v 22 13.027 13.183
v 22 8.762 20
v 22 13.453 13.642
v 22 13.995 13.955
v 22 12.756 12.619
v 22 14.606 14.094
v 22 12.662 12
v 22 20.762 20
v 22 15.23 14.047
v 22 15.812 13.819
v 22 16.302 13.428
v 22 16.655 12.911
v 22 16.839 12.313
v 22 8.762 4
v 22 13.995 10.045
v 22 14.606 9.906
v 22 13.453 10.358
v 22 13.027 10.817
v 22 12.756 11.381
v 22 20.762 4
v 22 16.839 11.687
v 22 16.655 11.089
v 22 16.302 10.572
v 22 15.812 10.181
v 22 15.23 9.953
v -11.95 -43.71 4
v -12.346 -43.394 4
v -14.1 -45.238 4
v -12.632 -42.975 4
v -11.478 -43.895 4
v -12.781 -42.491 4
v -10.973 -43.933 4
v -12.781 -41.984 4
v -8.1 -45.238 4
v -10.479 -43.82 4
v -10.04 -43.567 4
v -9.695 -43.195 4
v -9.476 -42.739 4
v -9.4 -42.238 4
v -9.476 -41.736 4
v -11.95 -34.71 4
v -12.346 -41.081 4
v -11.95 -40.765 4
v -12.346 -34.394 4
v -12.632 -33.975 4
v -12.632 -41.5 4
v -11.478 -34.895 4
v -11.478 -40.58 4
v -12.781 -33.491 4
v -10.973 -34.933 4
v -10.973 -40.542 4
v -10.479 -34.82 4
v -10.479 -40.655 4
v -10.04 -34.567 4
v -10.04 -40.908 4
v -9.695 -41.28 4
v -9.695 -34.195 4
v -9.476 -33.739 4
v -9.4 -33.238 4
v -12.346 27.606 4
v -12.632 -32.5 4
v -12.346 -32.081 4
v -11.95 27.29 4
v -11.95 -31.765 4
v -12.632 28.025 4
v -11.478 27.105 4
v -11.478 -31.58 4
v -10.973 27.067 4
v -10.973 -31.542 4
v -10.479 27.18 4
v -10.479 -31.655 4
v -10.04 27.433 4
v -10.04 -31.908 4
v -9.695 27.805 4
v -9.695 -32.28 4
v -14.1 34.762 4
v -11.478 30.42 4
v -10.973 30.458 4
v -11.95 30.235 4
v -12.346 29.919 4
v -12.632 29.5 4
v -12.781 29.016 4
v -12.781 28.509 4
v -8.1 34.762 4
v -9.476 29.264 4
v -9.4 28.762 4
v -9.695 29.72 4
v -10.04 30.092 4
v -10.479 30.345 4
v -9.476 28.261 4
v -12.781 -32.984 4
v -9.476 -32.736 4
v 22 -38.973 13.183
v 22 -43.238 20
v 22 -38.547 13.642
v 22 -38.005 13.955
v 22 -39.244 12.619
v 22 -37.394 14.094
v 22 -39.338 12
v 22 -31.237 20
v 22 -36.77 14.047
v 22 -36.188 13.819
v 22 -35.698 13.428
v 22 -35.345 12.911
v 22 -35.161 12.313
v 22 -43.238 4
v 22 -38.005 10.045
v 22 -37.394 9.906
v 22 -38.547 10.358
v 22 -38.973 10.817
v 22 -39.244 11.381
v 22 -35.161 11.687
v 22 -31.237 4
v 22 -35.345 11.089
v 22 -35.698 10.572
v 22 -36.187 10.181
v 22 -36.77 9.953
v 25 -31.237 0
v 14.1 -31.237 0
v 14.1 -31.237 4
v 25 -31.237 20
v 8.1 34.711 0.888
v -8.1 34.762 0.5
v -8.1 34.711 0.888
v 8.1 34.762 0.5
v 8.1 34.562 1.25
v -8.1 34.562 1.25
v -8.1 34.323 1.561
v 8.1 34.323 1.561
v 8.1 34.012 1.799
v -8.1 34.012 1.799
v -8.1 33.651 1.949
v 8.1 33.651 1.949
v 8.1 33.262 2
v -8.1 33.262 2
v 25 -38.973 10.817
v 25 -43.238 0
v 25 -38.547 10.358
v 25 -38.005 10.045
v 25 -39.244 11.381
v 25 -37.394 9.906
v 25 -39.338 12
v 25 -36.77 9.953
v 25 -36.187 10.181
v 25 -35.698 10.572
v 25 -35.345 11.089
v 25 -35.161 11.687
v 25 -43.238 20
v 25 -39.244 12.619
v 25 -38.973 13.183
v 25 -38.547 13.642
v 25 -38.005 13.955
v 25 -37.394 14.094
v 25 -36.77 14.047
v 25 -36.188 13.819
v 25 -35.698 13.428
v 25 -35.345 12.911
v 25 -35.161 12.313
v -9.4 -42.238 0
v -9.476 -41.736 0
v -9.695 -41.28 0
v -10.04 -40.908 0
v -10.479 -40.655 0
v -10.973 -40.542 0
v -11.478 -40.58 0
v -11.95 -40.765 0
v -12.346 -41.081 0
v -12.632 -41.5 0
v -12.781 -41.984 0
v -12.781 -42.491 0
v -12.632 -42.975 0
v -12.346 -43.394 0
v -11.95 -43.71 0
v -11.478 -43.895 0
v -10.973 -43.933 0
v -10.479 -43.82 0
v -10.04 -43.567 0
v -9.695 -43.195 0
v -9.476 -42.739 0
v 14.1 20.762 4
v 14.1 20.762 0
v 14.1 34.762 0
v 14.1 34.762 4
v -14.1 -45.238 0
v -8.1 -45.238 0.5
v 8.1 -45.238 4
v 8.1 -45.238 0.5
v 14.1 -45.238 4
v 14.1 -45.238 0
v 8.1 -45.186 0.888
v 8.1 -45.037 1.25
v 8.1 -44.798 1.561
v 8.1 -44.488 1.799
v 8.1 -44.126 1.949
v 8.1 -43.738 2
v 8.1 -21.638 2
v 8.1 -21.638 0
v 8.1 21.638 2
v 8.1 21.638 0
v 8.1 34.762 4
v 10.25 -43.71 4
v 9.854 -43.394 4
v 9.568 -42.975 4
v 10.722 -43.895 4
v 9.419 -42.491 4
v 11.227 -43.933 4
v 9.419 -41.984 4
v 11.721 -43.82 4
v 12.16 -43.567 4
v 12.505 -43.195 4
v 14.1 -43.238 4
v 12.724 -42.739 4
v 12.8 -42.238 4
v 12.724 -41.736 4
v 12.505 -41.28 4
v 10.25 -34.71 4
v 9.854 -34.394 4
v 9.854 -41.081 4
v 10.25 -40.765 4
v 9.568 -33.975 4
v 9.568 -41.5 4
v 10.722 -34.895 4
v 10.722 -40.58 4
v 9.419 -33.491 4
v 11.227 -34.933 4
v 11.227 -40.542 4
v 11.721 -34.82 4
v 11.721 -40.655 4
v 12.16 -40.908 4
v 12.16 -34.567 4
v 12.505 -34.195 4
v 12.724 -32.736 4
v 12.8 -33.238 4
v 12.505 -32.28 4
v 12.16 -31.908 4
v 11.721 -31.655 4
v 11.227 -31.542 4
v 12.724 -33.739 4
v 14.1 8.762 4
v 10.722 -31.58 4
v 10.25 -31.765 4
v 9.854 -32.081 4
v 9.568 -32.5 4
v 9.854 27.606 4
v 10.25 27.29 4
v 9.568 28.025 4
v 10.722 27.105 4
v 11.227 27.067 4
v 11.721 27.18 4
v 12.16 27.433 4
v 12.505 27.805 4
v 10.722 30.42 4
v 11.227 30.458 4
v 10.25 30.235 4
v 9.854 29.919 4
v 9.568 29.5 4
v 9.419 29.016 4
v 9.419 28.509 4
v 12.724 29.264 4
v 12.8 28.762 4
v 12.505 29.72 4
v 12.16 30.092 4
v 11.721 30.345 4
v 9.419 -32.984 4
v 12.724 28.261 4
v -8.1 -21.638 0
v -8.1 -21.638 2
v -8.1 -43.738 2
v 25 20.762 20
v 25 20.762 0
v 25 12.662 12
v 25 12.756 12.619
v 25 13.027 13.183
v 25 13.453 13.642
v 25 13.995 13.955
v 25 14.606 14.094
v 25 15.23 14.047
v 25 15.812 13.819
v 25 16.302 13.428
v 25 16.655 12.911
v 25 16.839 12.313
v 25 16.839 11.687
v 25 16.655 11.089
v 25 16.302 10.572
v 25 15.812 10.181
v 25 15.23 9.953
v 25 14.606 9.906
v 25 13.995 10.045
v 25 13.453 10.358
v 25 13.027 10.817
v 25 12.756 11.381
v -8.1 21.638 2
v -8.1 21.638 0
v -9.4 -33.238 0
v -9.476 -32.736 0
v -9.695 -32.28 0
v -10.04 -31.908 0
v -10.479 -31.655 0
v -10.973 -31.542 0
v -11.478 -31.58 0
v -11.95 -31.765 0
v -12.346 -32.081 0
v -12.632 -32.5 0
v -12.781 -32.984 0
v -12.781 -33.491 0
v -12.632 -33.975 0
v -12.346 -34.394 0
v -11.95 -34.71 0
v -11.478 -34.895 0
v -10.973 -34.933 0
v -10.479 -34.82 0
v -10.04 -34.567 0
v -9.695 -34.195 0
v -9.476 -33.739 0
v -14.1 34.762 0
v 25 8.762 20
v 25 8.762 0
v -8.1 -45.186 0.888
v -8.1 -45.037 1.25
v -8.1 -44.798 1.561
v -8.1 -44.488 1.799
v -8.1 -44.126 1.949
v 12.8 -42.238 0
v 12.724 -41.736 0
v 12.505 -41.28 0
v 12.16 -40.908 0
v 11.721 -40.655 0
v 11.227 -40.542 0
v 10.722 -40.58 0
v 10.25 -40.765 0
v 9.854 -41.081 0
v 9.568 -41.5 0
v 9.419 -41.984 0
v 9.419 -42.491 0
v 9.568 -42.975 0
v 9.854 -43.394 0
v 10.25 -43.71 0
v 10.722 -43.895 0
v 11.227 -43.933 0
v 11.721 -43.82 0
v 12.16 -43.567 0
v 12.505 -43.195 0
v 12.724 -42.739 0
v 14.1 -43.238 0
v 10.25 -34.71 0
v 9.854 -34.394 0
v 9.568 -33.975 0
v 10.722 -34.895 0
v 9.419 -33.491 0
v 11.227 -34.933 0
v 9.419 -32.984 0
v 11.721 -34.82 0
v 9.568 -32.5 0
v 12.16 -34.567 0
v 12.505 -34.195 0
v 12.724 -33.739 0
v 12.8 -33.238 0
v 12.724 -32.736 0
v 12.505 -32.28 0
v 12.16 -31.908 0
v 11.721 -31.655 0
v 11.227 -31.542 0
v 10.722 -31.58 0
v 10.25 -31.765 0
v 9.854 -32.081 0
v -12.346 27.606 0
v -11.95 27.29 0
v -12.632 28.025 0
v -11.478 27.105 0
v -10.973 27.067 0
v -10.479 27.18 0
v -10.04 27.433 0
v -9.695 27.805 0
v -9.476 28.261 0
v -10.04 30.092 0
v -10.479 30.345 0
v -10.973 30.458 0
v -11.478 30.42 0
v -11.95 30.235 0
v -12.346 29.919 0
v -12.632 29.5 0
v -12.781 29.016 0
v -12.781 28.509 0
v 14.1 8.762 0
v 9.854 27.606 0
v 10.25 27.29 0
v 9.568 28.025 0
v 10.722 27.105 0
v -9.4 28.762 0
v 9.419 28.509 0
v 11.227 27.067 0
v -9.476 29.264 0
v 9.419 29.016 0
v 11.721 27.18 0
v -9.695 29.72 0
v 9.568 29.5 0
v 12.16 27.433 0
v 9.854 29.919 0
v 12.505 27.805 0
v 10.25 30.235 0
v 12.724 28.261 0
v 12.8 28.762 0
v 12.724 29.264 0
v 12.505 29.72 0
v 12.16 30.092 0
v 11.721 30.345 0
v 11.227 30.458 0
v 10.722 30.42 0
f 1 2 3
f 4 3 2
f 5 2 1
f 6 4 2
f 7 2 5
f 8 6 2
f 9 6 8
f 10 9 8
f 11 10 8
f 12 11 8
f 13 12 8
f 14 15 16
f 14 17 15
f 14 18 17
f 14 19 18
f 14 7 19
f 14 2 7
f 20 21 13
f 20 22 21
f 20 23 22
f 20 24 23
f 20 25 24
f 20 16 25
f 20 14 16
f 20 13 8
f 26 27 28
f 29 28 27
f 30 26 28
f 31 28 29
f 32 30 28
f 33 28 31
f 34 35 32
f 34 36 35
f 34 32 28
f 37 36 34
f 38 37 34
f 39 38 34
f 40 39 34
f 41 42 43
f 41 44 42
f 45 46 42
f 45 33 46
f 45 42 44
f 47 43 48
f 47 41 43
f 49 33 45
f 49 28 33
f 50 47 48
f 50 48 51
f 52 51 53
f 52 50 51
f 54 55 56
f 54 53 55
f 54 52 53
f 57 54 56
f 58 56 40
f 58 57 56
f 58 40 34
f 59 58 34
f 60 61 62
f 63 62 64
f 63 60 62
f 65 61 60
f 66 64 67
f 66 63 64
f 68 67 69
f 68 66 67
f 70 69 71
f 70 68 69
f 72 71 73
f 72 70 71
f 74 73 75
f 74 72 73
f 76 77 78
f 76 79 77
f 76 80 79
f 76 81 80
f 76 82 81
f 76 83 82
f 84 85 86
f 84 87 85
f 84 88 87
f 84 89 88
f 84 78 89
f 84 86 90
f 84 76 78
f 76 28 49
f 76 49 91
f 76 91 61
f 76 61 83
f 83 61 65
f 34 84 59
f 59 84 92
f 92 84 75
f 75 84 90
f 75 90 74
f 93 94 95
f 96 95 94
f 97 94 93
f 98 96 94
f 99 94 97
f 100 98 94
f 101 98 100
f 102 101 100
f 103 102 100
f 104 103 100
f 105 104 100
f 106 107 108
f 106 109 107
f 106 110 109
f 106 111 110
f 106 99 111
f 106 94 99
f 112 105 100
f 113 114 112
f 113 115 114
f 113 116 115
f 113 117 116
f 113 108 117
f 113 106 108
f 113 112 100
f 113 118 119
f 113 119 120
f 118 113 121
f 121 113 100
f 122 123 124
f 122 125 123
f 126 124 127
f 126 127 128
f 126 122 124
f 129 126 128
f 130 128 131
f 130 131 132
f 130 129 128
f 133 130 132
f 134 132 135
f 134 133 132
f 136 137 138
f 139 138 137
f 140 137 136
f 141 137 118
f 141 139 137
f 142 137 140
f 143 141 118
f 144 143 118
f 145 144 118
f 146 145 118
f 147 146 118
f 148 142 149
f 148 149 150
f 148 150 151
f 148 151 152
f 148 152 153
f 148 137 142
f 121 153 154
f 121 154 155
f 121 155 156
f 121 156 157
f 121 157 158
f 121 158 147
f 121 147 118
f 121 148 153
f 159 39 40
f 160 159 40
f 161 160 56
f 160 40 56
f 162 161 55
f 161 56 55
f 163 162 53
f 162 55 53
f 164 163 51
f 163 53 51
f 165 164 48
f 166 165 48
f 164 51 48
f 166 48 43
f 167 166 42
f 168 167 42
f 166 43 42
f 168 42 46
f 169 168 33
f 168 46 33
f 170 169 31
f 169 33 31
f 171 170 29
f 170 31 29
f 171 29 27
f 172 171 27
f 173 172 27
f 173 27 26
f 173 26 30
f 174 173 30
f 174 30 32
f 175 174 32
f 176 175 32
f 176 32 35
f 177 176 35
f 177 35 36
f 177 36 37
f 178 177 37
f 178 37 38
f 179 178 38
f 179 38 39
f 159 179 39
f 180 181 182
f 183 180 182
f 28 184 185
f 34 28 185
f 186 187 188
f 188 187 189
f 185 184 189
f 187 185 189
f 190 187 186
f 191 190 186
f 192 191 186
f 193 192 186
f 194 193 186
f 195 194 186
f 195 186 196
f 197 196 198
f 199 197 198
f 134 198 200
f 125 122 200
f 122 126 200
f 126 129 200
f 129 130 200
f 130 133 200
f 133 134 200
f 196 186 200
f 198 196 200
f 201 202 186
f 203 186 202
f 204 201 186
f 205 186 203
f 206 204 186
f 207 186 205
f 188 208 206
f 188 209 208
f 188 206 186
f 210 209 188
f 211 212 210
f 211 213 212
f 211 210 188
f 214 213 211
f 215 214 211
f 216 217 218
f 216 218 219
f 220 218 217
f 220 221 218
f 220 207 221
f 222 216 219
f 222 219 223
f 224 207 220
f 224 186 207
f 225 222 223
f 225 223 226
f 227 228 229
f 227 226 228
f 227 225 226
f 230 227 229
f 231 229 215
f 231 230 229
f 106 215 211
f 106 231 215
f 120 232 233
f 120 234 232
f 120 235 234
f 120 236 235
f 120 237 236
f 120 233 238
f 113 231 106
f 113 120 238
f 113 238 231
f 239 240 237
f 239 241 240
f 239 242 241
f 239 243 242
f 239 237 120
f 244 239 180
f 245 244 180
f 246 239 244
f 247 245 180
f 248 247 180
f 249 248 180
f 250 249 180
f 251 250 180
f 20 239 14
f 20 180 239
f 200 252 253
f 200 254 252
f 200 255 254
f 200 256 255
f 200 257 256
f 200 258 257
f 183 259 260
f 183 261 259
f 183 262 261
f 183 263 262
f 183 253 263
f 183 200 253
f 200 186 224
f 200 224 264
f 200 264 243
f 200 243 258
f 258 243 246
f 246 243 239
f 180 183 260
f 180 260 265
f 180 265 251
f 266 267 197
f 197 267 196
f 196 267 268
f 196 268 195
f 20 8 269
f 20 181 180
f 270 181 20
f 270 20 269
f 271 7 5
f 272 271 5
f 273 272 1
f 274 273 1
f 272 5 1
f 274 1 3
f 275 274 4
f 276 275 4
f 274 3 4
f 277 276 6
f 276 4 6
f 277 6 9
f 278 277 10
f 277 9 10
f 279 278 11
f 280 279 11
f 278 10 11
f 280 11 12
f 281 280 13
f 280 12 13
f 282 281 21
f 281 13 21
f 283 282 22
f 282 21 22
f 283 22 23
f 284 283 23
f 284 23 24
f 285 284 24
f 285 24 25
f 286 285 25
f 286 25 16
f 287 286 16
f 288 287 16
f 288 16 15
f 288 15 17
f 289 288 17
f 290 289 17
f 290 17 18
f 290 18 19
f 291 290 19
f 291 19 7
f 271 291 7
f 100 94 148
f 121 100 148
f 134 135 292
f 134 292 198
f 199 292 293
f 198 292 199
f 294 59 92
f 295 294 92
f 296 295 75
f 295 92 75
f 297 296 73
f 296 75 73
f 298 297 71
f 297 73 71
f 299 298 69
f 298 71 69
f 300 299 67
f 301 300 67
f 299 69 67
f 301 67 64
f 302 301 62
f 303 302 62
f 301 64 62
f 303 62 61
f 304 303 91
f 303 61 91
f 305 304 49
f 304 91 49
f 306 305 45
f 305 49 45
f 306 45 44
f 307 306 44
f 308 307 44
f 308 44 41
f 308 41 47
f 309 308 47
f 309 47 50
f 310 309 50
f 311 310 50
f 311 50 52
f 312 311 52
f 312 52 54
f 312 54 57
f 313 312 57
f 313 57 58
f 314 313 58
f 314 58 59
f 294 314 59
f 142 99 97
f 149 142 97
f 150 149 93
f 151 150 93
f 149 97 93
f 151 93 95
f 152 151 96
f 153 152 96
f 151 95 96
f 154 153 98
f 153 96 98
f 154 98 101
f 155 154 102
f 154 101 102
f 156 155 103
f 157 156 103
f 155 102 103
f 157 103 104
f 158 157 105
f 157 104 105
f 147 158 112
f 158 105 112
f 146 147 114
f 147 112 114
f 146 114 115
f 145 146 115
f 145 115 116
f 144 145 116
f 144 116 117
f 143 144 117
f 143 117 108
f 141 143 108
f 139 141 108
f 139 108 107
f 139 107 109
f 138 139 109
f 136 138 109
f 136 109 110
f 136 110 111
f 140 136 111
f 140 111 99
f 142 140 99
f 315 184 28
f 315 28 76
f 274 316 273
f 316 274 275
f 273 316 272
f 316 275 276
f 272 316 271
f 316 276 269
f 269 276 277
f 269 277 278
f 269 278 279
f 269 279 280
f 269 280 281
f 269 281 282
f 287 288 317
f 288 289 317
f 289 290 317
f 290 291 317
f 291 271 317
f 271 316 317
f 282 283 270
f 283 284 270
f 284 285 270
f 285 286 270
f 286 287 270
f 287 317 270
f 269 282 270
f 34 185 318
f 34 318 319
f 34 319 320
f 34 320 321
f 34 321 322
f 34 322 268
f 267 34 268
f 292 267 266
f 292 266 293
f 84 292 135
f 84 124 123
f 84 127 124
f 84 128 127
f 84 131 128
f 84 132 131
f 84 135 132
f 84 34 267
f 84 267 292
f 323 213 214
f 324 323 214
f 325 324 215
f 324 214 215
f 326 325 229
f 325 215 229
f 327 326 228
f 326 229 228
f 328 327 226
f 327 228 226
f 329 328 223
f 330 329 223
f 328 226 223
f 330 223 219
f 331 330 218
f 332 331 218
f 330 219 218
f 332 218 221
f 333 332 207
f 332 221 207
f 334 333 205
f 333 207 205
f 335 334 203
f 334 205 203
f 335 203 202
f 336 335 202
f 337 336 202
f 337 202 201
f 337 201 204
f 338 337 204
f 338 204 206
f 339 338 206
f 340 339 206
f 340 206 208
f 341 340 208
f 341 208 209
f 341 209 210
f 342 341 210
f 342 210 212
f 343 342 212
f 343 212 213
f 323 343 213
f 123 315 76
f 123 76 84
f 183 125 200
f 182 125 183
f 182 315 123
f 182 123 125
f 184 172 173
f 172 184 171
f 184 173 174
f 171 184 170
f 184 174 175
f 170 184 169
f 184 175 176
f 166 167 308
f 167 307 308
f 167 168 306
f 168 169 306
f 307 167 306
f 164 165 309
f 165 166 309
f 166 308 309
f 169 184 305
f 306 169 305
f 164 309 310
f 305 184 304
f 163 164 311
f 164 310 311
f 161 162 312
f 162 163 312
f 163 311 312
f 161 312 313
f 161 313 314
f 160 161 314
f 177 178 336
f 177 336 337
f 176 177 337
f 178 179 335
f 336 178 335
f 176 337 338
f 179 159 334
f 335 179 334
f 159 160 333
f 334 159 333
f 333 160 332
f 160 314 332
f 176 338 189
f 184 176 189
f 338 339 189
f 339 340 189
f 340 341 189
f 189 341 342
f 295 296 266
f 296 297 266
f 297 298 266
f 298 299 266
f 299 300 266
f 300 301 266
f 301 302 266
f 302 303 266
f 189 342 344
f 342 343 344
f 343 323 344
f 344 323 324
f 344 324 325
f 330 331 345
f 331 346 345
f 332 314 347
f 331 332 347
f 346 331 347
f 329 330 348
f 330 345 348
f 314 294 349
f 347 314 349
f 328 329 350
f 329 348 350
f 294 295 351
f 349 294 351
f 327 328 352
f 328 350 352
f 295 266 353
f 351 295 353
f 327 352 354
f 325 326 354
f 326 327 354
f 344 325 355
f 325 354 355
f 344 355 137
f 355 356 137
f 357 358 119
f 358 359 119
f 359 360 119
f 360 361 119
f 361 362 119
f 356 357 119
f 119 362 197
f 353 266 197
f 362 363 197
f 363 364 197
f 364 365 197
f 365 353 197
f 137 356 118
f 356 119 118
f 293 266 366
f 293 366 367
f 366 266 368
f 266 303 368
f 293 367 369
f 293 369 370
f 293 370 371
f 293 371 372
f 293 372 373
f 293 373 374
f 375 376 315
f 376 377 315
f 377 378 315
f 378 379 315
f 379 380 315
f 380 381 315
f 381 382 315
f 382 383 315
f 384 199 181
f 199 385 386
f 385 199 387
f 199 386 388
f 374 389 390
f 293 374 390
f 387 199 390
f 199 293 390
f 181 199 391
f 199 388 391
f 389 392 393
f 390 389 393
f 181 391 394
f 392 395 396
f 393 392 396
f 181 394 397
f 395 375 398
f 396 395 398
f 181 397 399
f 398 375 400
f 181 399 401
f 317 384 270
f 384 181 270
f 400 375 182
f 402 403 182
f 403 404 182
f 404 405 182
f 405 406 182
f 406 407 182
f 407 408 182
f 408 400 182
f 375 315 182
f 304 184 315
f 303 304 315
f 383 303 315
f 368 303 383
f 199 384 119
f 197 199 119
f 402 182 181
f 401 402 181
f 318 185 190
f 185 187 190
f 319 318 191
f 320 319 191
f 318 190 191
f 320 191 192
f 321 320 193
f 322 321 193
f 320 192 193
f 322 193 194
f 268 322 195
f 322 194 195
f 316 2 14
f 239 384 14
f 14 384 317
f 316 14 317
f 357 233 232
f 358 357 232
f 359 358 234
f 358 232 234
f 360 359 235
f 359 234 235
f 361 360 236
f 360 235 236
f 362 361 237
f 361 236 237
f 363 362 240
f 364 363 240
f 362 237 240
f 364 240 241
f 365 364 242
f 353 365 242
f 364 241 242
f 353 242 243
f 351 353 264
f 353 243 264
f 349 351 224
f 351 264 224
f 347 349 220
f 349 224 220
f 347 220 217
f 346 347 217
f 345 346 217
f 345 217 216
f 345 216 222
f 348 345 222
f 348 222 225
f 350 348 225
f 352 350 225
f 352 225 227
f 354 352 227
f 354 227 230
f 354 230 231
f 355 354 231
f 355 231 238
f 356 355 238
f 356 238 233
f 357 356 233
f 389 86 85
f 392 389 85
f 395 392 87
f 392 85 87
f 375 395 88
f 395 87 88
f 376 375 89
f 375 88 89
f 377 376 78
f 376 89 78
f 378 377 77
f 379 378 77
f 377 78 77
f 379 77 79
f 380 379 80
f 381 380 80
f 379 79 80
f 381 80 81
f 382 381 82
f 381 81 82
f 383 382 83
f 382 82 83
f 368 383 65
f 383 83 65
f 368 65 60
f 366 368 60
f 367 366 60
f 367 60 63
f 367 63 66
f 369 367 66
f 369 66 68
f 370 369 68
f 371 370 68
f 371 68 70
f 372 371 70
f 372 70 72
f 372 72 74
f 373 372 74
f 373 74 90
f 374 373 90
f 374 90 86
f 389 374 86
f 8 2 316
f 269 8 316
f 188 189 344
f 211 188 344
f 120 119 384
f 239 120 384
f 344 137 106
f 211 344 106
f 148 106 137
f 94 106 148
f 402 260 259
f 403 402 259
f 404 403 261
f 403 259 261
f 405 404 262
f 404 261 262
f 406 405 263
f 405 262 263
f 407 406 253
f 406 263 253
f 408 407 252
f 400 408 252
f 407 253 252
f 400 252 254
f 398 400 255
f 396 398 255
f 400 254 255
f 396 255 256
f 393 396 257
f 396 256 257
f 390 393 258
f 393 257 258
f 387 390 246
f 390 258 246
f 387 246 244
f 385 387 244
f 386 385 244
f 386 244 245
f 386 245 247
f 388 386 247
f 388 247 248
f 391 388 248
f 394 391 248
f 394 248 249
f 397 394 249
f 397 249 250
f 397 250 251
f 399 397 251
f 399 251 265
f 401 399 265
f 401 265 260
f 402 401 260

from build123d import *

# Parameters (mm, degrees)
SKETCH001_W     = 28.2
SKETCH001_H     = 80
PAD_DEPTH       = 4
SKETCH002_W     = 16.2
SKETCH002_H     = 80
POCKET_DEPTH    = 2
SKETCH003_W     = 16.2
SKETCH003_H     = 43.275
POCKET001_DEPTH = 2
SKETCH010_R     = 1.7
POCKET004_DEPTH = 4.001
SKETCH021_R     = 1.7
POCKET008_DEPTH = 4.001
FILLET_R        = 1.5
FILLET001_R     = 1.5
SKETCH025_W     = 12
SKETCH025_H     = 4
PAD009_DEPTH    = 10.9
SKETCH026_W     = 3
SKETCH026_H     = 12
PAD010_DEPTH    = 16
SKETCH027_R     = 2.1
POCKET010_DEPTH = 3.001


with BuildPart() as part:
    # Sketch001 → Pad (new body)
    with BuildSketch(Plane.XY):
        with Locations((0, -5.2375)):
            Rectangle(SKETCH001_W, SKETCH001_H)
    extrude(amount=PAD_DEPTH)

    # Sketch002 (on Face6 of Pad) → Pocket (cut)
    with BuildSketch(Plane.XY.offset(4)):
        with Locations((0, -5.2375)):
            Rectangle(SKETCH002_W, SKETCH002_H)
    extrude(amount=-POCKET_DEPTH, mode=Mode.SUBTRACT)

    # Sketch003 (on Face6 of Pocket) → Pocket001 (cut)
    with BuildSketch(Plane.XY.offset(2)):
        Rectangle(SKETCH003_W, SKETCH003_H)
    extrude(amount=-POCKET001_DEPTH, mode=Mode.SUBTRACT)

    # Sketch010 (on Face8 of Pocket001) → Pocket004 (cut, through all)
    with BuildSketch(Plane.XY.offset(4)):
        with Locations((-11.1, -42.2375)):
            Circle(SKETCH010_R)
        with Locations((-11.1, -33.2375)):
            Circle(SKETCH010_R)
        with Locations((11.1, -33.2375)):
            Circle(SKETCH010_R)
        with Locations((11.1, -42.2375)):
            Circle(SKETCH010_R)
    extrude(amount=-POCKET004_DEPTH, mode=Mode.SUBTRACT)

    # Sketch021 (on Face8 of Pocket004) → Pocket008 (cut, through all)
    with BuildSketch(Plane.XY.offset(4)):
        with Locations((-11.1, 28.7625)):
            Circle(SKETCH021_R)
        with Locations((11.1, 28.7625)):
            Circle(SKETCH021_R)
    extrude(amount=-POCKET008_DEPTH, mode=Mode.SUBTRACT)

    # Fillet
    fillet_edges = [part.edges().sort_by_distance(p)[0] for p in [
        (0, 34.7625, 2),
    ]]
    fillet(fillet_edges, radius=FILLET_R)

    # Fillet001
    fillet001_edges = [part.edges().sort_by_distance(p)[0] for p in [
        (0, -45.2375, 2),
    ]]
    fillet(fillet001_edges, radius=FILLET001_R)

    # Sketch025 (on Face15 of Fillet001) → Pad009 (join)
    with BuildSketch(Plane.YZ.offset(14.1)):
        with Locations((-37.2375, 2)):
            Rectangle(SKETCH025_W, SKETCH025_H)
        with Locations((14.7625, 2)):
            Rectangle(SKETCH025_W, SKETCH025_H)
    extrude(amount=PAD009_DEPTH)

    # Sketch026 (on Face28 of Pad009) → Pad010 (join)
    with BuildSketch(Plane.XY.offset(4)):
        with Locations((23.5, 14.7625)):
            Rectangle(SKETCH026_W, SKETCH026_H)
        with Locations((23.5, -37.2375)):
            Rectangle(SKETCH026_W, SKETCH026_H)
    extrude(amount=PAD010_DEPTH)

    # Sketch027 (on Face36 of Pad010) → Pocket010 (cut, through all)
    with BuildSketch(Plane(origin=(22, 0, 0), x_dir=(0, -1, 0), z_dir=(-1, 0, 0))):
        with Locations((-14.7625, 12)):
            Circle(SKETCH027_R)
        with Locations((37.2375, 12)):
            Circle(SKETCH027_R)
    extrude(amount=-POCKET010_DEPTH, mode=Mode.SUBTRACT)


solid = part.part
